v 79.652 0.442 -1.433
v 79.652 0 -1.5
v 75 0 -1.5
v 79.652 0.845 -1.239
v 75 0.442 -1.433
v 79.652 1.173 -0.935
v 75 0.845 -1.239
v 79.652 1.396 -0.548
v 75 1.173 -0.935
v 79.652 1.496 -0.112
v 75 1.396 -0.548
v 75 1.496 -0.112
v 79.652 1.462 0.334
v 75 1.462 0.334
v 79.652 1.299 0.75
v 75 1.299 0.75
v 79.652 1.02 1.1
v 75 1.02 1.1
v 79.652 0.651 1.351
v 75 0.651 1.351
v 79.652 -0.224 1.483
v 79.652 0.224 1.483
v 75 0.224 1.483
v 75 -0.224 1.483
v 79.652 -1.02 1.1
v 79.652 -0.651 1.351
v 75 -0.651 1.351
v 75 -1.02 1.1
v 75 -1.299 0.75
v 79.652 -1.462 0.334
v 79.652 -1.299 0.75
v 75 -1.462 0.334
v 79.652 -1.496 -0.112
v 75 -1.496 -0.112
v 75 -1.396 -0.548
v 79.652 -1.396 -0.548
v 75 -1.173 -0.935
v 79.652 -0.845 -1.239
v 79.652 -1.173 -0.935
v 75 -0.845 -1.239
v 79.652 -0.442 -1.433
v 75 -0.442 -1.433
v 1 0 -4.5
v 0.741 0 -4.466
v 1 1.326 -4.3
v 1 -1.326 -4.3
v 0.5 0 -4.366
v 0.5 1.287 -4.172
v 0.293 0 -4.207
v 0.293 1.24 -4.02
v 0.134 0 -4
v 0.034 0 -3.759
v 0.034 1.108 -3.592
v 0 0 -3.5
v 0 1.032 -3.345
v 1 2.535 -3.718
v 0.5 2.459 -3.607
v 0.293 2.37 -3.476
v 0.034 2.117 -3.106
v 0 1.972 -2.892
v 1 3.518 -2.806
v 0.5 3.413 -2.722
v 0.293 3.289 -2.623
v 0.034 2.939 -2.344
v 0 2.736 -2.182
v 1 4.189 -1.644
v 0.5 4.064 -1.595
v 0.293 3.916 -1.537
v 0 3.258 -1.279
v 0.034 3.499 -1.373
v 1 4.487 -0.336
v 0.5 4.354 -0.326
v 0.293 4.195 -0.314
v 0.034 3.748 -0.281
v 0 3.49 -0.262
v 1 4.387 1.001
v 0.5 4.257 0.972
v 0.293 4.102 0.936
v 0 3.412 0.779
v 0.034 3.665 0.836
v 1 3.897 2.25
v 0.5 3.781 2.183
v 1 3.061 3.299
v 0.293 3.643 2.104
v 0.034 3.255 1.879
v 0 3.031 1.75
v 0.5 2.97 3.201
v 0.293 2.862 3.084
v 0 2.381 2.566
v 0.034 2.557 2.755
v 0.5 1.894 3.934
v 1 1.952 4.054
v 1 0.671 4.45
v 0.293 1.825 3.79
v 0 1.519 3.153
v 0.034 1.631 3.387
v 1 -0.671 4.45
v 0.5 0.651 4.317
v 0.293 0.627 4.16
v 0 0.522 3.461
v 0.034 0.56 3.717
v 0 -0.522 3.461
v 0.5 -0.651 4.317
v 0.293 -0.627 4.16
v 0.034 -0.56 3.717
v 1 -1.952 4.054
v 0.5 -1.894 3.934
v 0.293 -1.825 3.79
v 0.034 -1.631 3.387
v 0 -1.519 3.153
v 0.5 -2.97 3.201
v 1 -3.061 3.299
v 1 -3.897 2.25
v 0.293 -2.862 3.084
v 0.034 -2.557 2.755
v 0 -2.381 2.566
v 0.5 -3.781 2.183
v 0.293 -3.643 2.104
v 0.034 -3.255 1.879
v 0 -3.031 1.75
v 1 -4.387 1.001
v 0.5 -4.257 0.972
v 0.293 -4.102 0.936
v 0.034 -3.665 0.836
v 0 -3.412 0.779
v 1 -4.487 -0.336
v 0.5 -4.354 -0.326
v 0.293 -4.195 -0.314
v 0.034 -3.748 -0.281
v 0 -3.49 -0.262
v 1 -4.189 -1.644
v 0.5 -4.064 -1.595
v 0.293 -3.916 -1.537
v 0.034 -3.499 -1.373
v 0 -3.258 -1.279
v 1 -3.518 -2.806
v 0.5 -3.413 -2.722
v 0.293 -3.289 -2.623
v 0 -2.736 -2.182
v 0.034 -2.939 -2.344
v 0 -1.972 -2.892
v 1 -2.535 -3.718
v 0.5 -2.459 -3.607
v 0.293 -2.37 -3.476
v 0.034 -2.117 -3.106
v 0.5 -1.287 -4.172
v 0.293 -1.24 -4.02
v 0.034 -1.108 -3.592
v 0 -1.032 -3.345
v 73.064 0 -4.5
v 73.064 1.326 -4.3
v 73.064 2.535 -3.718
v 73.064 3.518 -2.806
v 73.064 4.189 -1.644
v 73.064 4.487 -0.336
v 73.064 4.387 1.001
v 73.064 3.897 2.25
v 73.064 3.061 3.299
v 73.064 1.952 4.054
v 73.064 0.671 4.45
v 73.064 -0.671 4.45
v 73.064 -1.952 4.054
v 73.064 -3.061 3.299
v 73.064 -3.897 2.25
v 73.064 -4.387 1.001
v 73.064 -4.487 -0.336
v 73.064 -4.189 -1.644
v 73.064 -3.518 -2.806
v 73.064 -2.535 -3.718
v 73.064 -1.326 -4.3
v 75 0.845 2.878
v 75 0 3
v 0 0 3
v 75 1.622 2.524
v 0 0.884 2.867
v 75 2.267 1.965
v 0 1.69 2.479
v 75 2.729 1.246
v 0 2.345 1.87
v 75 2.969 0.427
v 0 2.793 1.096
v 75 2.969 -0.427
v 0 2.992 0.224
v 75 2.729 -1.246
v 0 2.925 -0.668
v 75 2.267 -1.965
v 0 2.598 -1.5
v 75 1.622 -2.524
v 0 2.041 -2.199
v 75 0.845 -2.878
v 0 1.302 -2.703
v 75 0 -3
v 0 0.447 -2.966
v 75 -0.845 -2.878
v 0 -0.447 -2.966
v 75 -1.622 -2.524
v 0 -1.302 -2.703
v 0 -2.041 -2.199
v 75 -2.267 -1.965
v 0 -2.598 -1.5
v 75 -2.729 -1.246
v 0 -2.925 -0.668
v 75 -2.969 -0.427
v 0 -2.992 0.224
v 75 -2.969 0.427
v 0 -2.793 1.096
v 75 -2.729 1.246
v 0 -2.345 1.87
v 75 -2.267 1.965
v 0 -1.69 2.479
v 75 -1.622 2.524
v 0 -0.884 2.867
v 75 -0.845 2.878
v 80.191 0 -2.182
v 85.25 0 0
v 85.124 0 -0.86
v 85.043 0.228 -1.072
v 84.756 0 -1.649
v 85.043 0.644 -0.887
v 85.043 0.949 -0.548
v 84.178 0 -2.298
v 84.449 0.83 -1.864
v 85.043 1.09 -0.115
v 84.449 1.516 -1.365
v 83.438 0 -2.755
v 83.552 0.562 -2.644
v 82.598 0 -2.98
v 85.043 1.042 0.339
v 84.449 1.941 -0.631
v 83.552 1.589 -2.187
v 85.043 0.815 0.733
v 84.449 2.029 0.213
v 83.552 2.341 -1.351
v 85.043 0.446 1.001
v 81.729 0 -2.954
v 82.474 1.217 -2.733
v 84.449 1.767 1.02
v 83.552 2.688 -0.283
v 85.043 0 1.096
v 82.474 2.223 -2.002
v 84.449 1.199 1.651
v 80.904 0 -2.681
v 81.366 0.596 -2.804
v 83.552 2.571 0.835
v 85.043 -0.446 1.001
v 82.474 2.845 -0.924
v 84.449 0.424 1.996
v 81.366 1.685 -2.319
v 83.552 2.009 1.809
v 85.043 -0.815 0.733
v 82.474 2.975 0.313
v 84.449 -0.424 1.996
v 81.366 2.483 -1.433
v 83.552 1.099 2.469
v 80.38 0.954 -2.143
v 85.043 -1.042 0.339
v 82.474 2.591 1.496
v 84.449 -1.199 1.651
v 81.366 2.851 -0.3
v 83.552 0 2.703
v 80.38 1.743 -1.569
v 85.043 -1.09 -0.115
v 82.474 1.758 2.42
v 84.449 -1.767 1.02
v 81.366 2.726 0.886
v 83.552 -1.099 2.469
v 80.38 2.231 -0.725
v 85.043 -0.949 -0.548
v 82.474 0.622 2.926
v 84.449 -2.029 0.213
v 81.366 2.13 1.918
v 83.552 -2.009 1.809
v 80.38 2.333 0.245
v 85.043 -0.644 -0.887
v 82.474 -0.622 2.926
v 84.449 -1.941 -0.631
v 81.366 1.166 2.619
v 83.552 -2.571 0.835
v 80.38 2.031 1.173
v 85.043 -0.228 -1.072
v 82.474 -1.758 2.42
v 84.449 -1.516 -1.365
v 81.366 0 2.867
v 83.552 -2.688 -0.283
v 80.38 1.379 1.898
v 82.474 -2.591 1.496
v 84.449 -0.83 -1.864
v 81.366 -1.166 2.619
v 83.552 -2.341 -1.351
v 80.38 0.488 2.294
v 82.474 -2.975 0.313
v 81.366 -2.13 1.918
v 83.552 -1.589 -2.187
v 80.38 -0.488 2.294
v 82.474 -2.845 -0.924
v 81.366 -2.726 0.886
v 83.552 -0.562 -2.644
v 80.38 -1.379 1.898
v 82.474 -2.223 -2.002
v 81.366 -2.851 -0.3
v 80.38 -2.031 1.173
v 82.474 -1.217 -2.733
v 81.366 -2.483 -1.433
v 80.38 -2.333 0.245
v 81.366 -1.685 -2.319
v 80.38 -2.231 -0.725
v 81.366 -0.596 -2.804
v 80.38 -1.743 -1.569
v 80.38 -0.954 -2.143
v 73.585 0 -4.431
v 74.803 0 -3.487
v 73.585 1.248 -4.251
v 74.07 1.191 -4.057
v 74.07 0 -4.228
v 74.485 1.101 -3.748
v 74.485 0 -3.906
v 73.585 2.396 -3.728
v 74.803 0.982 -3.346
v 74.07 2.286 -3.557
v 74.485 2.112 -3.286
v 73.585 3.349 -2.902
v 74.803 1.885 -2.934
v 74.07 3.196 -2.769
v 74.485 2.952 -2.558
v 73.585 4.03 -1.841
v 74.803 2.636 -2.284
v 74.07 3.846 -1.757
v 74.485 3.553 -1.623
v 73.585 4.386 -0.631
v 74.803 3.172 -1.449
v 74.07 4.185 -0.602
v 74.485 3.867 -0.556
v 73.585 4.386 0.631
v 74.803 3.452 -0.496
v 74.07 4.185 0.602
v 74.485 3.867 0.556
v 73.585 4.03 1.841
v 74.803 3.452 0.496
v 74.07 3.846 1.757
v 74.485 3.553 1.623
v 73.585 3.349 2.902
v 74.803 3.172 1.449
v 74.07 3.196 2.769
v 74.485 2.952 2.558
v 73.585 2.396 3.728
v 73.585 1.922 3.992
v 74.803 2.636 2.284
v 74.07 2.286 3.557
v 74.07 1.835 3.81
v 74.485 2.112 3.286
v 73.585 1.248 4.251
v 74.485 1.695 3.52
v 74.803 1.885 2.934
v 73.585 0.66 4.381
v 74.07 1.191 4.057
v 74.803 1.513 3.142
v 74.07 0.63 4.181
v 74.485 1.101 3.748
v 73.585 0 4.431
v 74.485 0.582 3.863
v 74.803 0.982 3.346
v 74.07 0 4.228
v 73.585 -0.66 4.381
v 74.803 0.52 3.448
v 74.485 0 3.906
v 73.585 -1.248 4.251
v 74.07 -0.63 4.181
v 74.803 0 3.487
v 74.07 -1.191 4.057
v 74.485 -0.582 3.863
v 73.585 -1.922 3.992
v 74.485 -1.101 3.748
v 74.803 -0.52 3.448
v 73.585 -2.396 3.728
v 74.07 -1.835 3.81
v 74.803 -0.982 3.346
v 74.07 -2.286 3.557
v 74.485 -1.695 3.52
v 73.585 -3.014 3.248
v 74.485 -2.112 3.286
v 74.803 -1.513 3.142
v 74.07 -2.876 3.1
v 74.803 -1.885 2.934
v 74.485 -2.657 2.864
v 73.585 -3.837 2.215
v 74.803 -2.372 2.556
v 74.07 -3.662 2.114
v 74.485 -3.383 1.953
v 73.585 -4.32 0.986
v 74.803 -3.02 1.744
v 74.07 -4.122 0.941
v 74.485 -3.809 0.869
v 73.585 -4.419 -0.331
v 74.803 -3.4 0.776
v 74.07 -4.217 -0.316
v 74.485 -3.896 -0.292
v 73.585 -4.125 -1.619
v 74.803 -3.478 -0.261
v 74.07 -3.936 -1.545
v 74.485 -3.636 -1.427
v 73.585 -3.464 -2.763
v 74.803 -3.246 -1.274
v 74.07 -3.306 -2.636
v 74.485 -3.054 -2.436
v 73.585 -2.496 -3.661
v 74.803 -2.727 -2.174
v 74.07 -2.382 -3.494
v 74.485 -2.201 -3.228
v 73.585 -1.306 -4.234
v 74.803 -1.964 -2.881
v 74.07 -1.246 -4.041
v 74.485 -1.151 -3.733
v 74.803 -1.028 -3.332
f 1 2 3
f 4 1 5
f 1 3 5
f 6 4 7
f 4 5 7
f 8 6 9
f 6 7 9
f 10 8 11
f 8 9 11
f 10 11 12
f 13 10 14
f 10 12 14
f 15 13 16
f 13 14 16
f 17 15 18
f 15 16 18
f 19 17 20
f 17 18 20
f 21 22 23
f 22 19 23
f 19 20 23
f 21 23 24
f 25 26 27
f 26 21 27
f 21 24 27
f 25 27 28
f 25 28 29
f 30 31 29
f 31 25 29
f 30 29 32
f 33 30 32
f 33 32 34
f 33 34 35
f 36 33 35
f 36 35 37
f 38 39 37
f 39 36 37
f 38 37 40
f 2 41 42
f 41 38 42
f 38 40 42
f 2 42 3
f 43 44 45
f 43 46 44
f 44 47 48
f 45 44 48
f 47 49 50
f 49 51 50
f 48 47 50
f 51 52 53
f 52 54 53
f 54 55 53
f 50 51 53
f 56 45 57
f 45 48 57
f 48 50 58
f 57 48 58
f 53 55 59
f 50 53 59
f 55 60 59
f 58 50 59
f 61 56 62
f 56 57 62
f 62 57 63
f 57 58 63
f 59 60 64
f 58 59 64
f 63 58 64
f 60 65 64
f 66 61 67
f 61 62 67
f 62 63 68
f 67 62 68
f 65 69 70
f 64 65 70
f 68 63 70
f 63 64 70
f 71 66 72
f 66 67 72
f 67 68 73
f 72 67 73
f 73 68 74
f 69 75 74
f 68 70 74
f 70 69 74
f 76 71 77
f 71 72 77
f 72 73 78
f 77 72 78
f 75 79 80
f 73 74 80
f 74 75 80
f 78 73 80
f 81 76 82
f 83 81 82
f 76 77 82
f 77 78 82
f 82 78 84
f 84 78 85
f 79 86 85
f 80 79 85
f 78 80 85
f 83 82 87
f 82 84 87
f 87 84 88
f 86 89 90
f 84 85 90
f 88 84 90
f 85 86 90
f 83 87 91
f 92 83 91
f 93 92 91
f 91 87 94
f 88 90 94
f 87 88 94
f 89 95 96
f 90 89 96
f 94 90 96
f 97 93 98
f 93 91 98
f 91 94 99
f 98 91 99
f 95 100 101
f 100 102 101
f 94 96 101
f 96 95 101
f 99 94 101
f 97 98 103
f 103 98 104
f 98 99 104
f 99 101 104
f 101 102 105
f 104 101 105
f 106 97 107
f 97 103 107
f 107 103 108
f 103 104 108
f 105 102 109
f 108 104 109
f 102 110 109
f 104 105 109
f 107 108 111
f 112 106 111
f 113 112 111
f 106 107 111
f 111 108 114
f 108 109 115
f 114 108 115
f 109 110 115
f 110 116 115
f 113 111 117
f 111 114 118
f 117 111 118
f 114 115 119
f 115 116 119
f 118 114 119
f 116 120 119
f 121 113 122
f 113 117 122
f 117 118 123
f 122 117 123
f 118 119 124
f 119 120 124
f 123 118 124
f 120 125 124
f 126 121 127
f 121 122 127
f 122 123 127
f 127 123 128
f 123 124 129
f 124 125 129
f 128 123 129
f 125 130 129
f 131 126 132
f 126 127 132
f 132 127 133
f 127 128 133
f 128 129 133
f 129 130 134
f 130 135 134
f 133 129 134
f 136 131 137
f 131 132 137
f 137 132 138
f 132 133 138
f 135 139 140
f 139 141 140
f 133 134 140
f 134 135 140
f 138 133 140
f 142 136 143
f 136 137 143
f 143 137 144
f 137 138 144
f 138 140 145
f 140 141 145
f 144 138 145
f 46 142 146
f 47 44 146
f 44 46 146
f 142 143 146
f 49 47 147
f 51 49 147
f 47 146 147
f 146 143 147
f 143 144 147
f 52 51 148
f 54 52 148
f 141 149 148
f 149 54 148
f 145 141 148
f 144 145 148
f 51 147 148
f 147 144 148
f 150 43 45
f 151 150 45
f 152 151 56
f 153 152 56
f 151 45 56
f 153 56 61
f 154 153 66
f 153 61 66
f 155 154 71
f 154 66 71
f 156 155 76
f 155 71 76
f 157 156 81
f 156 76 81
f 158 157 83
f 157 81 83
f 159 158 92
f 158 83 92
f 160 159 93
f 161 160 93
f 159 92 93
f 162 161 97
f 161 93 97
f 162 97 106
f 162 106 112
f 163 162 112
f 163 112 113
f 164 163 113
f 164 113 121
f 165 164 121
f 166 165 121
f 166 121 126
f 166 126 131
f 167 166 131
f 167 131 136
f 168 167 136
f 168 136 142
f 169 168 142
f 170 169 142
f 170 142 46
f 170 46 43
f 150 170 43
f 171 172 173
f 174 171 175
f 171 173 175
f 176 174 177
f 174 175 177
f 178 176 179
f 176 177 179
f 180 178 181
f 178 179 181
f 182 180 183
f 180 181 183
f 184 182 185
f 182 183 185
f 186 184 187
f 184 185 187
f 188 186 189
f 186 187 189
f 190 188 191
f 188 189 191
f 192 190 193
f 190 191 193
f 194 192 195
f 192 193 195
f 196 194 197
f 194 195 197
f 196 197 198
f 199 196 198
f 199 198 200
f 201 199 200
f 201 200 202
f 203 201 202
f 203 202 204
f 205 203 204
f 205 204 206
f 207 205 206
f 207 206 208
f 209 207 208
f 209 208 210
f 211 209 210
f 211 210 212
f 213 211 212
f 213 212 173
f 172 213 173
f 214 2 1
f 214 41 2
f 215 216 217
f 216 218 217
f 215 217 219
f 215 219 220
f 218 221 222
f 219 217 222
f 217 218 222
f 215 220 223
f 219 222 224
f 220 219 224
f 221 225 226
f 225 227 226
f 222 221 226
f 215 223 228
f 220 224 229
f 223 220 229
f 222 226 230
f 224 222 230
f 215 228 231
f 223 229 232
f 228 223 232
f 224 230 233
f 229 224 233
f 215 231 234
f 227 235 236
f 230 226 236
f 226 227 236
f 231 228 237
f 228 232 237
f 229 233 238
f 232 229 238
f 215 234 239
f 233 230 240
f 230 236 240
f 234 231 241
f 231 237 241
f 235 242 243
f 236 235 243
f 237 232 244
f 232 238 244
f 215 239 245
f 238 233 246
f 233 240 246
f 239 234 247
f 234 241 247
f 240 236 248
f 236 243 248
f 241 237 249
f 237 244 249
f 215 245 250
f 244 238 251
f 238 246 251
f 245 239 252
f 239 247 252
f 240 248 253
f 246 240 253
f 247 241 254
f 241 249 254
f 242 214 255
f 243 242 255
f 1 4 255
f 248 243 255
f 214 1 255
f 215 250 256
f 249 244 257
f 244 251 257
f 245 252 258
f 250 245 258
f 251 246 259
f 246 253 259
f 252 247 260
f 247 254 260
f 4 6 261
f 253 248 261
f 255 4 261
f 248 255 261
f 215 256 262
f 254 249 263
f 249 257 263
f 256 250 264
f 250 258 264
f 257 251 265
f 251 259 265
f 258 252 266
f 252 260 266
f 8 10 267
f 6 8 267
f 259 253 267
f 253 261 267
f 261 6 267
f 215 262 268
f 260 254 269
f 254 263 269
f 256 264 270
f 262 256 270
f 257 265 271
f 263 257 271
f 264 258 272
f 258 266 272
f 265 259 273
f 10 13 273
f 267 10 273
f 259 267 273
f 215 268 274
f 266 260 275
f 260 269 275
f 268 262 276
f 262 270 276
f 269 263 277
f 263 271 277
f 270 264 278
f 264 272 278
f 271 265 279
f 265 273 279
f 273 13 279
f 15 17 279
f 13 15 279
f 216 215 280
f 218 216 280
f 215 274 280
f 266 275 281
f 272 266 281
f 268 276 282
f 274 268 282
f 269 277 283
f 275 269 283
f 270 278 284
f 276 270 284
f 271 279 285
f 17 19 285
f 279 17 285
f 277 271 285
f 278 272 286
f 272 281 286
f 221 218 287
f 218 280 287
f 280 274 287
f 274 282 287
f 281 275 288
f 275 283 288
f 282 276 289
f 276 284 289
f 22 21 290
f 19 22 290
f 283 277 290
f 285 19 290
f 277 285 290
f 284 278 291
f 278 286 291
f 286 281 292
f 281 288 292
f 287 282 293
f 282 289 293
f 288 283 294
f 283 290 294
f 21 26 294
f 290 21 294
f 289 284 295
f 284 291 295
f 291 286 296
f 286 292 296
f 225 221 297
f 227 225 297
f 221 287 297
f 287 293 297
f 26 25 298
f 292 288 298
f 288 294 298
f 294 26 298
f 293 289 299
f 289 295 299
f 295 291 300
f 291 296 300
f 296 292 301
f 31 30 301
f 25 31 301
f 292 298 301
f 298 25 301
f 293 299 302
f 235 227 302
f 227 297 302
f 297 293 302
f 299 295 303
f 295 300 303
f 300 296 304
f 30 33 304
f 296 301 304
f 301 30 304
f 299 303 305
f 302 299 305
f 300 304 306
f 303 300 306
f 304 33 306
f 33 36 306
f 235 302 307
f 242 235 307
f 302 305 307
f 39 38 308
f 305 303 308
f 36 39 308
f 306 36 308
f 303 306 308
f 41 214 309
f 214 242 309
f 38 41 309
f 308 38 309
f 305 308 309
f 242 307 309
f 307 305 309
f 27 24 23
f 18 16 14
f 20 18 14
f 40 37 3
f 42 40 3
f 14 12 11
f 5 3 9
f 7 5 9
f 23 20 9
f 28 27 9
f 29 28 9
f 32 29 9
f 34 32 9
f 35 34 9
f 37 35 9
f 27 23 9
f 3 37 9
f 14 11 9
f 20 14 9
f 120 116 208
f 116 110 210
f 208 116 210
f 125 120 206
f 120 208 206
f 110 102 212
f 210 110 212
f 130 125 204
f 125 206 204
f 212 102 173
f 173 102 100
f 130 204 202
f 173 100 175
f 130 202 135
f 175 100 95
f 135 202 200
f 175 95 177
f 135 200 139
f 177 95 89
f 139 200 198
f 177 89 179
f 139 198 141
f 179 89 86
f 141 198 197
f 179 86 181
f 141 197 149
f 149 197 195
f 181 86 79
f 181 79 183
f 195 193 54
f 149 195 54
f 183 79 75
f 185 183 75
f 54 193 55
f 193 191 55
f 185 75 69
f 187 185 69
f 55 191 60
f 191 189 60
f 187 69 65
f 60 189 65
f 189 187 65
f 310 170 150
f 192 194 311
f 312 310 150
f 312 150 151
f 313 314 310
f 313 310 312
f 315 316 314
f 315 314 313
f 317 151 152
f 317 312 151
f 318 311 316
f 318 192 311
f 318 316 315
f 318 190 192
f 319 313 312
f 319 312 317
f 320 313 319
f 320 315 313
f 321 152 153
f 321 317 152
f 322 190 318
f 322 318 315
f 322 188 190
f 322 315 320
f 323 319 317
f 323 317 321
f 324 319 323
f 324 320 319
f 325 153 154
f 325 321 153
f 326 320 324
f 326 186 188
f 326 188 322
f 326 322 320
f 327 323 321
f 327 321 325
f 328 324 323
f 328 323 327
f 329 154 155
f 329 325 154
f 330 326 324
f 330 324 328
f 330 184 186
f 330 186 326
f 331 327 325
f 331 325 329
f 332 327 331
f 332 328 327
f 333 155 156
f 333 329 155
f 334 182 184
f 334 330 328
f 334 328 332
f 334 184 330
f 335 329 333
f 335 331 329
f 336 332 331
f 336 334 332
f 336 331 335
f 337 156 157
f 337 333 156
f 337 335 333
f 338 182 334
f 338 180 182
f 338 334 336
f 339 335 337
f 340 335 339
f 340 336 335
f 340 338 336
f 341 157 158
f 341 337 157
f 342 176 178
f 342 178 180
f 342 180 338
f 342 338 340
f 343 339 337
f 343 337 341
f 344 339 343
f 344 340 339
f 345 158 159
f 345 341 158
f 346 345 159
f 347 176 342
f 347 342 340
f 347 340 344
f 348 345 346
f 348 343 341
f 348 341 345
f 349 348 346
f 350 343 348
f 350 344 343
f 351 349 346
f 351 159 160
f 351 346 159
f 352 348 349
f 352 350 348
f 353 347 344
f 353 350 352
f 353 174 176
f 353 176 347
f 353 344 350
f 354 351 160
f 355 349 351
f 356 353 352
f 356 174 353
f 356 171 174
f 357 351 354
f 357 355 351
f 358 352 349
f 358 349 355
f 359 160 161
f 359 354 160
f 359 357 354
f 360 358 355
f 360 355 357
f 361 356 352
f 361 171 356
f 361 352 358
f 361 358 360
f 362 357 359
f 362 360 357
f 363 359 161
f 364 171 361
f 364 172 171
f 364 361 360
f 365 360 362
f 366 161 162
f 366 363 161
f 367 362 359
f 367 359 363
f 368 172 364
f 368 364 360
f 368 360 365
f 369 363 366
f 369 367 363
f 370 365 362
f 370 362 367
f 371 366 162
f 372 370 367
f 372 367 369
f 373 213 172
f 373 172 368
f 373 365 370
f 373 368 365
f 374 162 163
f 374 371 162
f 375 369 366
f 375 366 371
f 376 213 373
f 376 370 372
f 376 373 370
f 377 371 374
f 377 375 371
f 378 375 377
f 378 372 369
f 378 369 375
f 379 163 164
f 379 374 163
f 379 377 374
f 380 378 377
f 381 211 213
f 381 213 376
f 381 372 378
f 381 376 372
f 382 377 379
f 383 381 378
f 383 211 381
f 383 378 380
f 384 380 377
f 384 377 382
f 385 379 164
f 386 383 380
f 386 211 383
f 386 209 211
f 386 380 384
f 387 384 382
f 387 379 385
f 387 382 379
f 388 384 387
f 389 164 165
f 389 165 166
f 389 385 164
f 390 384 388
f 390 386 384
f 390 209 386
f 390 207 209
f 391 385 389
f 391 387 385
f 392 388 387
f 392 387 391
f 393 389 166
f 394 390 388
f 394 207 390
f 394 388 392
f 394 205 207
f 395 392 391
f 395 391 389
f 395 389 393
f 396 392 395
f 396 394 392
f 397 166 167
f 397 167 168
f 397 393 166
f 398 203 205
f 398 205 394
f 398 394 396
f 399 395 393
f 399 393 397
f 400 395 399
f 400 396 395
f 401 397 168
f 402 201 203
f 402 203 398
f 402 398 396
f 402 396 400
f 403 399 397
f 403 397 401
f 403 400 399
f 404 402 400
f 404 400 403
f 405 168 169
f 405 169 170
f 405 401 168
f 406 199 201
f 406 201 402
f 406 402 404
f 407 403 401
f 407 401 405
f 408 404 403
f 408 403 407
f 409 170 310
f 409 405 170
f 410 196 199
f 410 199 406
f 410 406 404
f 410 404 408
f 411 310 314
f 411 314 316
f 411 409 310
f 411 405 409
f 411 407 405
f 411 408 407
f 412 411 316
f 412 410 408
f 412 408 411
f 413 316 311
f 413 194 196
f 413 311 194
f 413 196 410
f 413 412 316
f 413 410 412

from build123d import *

# Parameters (mm, degrees)
SKETCH2_R           = 4.5
BOSS_EXTRUDE1_DEPTH = 75
SKETCH3_R           = 3
CUT_EXTRUDE1_DEPTH  = 100
SKETCH4_R           = 1.5
BOSS_EXTRUDE2_DEPTH = 5
FILLET1_R           = 2
FILLET3_R           = 1


with BuildPart() as part:
    # Sketch2 → Boss-Extrude1 (new body)
    with BuildSketch(Plane(origin=(0, 0, 0), x_dir=(0, 0, -1), z_dir=(1, 0, 0))):
        Circle(SKETCH2_R)
    extrude(amount=BOSS_EXTRUDE1_DEPTH)

    # Sketch3 → Cut-Extrude1 (cut)
    with BuildSketch(Plane.ZY):
        Circle(SKETCH3_R)
    extrude(amount=-CUT_EXTRUDE1_DEPTH, mode=Mode.SUBTRACT)

    # Fillet1
    # the kernel refuses this fillet: 2 mm, written as the material it takes off along each edge
    with BuildSketch(Plane(origin=(75, 0, 0), x_dir=(0, 0, -1), z_dir=(0, -1, 0))) as fillet1_piece_1:
        with BuildLine():
            CenterArc((2.5, -1.936491673), FILLET1_R, 0, 75.522487814)
            Line((3, 0), (3.01, 0.038729833))
            ThreePointArc((3.01, 0.038729833), (3.75, 0.04), (4.5, 0.04))
            Line((4.5, 0.04), (4.54, 0))
            Line((4.54, 0), (4.54, -1.936491673))
            Line((4.54, -1.936491673), (4.5, -1.936491673))
        make_face()
    revolve(axis=Axis((75, 0, 0), (1, 0, 0)), mode=Mode.SUBTRACT)

    # Fillet3
    fillet3_edges = [part.edges().sort_by_distance(p)[0] for p in [
        (0, 0, 4.5),
    ]]
    fillet(fillet3_edges, radius=FILLET3_R)


with BuildPart() as body_2:
    # Sketch4 → Boss-Extrude2 (new body)
    with BuildSketch(Plane(origin=(75, 0, 0), x_dir=(0, 0, -1), z_dir=(1, 0, 0))):
        Circle(SKETCH4_R)
    extrude(amount=BOSS_EXTRUDE2_DEPTH)

    # Sketch5 → Revolve1 (revolve)
    with BuildSketch(Plane(origin=(0, 0, 0), x_dir=(1, 0, 0), z_dir=(0, 1, 0))):
        with BuildLine():
            Line((80, 0), (82.25, 0))
            Line((82.25, 0), (85.25, 0))
            ThreePointArc((85.25, 0), (82.25, 3), (79.25, 0))
            Line((79.25, 0), (79.5, 0))
            Line((79.5, 0), (80, 0))
        make_face()
    revolve(axis=Axis((82.25, 0, 0), (1, 0, 0)))


solid = Compound([part.part, body_2.part])
